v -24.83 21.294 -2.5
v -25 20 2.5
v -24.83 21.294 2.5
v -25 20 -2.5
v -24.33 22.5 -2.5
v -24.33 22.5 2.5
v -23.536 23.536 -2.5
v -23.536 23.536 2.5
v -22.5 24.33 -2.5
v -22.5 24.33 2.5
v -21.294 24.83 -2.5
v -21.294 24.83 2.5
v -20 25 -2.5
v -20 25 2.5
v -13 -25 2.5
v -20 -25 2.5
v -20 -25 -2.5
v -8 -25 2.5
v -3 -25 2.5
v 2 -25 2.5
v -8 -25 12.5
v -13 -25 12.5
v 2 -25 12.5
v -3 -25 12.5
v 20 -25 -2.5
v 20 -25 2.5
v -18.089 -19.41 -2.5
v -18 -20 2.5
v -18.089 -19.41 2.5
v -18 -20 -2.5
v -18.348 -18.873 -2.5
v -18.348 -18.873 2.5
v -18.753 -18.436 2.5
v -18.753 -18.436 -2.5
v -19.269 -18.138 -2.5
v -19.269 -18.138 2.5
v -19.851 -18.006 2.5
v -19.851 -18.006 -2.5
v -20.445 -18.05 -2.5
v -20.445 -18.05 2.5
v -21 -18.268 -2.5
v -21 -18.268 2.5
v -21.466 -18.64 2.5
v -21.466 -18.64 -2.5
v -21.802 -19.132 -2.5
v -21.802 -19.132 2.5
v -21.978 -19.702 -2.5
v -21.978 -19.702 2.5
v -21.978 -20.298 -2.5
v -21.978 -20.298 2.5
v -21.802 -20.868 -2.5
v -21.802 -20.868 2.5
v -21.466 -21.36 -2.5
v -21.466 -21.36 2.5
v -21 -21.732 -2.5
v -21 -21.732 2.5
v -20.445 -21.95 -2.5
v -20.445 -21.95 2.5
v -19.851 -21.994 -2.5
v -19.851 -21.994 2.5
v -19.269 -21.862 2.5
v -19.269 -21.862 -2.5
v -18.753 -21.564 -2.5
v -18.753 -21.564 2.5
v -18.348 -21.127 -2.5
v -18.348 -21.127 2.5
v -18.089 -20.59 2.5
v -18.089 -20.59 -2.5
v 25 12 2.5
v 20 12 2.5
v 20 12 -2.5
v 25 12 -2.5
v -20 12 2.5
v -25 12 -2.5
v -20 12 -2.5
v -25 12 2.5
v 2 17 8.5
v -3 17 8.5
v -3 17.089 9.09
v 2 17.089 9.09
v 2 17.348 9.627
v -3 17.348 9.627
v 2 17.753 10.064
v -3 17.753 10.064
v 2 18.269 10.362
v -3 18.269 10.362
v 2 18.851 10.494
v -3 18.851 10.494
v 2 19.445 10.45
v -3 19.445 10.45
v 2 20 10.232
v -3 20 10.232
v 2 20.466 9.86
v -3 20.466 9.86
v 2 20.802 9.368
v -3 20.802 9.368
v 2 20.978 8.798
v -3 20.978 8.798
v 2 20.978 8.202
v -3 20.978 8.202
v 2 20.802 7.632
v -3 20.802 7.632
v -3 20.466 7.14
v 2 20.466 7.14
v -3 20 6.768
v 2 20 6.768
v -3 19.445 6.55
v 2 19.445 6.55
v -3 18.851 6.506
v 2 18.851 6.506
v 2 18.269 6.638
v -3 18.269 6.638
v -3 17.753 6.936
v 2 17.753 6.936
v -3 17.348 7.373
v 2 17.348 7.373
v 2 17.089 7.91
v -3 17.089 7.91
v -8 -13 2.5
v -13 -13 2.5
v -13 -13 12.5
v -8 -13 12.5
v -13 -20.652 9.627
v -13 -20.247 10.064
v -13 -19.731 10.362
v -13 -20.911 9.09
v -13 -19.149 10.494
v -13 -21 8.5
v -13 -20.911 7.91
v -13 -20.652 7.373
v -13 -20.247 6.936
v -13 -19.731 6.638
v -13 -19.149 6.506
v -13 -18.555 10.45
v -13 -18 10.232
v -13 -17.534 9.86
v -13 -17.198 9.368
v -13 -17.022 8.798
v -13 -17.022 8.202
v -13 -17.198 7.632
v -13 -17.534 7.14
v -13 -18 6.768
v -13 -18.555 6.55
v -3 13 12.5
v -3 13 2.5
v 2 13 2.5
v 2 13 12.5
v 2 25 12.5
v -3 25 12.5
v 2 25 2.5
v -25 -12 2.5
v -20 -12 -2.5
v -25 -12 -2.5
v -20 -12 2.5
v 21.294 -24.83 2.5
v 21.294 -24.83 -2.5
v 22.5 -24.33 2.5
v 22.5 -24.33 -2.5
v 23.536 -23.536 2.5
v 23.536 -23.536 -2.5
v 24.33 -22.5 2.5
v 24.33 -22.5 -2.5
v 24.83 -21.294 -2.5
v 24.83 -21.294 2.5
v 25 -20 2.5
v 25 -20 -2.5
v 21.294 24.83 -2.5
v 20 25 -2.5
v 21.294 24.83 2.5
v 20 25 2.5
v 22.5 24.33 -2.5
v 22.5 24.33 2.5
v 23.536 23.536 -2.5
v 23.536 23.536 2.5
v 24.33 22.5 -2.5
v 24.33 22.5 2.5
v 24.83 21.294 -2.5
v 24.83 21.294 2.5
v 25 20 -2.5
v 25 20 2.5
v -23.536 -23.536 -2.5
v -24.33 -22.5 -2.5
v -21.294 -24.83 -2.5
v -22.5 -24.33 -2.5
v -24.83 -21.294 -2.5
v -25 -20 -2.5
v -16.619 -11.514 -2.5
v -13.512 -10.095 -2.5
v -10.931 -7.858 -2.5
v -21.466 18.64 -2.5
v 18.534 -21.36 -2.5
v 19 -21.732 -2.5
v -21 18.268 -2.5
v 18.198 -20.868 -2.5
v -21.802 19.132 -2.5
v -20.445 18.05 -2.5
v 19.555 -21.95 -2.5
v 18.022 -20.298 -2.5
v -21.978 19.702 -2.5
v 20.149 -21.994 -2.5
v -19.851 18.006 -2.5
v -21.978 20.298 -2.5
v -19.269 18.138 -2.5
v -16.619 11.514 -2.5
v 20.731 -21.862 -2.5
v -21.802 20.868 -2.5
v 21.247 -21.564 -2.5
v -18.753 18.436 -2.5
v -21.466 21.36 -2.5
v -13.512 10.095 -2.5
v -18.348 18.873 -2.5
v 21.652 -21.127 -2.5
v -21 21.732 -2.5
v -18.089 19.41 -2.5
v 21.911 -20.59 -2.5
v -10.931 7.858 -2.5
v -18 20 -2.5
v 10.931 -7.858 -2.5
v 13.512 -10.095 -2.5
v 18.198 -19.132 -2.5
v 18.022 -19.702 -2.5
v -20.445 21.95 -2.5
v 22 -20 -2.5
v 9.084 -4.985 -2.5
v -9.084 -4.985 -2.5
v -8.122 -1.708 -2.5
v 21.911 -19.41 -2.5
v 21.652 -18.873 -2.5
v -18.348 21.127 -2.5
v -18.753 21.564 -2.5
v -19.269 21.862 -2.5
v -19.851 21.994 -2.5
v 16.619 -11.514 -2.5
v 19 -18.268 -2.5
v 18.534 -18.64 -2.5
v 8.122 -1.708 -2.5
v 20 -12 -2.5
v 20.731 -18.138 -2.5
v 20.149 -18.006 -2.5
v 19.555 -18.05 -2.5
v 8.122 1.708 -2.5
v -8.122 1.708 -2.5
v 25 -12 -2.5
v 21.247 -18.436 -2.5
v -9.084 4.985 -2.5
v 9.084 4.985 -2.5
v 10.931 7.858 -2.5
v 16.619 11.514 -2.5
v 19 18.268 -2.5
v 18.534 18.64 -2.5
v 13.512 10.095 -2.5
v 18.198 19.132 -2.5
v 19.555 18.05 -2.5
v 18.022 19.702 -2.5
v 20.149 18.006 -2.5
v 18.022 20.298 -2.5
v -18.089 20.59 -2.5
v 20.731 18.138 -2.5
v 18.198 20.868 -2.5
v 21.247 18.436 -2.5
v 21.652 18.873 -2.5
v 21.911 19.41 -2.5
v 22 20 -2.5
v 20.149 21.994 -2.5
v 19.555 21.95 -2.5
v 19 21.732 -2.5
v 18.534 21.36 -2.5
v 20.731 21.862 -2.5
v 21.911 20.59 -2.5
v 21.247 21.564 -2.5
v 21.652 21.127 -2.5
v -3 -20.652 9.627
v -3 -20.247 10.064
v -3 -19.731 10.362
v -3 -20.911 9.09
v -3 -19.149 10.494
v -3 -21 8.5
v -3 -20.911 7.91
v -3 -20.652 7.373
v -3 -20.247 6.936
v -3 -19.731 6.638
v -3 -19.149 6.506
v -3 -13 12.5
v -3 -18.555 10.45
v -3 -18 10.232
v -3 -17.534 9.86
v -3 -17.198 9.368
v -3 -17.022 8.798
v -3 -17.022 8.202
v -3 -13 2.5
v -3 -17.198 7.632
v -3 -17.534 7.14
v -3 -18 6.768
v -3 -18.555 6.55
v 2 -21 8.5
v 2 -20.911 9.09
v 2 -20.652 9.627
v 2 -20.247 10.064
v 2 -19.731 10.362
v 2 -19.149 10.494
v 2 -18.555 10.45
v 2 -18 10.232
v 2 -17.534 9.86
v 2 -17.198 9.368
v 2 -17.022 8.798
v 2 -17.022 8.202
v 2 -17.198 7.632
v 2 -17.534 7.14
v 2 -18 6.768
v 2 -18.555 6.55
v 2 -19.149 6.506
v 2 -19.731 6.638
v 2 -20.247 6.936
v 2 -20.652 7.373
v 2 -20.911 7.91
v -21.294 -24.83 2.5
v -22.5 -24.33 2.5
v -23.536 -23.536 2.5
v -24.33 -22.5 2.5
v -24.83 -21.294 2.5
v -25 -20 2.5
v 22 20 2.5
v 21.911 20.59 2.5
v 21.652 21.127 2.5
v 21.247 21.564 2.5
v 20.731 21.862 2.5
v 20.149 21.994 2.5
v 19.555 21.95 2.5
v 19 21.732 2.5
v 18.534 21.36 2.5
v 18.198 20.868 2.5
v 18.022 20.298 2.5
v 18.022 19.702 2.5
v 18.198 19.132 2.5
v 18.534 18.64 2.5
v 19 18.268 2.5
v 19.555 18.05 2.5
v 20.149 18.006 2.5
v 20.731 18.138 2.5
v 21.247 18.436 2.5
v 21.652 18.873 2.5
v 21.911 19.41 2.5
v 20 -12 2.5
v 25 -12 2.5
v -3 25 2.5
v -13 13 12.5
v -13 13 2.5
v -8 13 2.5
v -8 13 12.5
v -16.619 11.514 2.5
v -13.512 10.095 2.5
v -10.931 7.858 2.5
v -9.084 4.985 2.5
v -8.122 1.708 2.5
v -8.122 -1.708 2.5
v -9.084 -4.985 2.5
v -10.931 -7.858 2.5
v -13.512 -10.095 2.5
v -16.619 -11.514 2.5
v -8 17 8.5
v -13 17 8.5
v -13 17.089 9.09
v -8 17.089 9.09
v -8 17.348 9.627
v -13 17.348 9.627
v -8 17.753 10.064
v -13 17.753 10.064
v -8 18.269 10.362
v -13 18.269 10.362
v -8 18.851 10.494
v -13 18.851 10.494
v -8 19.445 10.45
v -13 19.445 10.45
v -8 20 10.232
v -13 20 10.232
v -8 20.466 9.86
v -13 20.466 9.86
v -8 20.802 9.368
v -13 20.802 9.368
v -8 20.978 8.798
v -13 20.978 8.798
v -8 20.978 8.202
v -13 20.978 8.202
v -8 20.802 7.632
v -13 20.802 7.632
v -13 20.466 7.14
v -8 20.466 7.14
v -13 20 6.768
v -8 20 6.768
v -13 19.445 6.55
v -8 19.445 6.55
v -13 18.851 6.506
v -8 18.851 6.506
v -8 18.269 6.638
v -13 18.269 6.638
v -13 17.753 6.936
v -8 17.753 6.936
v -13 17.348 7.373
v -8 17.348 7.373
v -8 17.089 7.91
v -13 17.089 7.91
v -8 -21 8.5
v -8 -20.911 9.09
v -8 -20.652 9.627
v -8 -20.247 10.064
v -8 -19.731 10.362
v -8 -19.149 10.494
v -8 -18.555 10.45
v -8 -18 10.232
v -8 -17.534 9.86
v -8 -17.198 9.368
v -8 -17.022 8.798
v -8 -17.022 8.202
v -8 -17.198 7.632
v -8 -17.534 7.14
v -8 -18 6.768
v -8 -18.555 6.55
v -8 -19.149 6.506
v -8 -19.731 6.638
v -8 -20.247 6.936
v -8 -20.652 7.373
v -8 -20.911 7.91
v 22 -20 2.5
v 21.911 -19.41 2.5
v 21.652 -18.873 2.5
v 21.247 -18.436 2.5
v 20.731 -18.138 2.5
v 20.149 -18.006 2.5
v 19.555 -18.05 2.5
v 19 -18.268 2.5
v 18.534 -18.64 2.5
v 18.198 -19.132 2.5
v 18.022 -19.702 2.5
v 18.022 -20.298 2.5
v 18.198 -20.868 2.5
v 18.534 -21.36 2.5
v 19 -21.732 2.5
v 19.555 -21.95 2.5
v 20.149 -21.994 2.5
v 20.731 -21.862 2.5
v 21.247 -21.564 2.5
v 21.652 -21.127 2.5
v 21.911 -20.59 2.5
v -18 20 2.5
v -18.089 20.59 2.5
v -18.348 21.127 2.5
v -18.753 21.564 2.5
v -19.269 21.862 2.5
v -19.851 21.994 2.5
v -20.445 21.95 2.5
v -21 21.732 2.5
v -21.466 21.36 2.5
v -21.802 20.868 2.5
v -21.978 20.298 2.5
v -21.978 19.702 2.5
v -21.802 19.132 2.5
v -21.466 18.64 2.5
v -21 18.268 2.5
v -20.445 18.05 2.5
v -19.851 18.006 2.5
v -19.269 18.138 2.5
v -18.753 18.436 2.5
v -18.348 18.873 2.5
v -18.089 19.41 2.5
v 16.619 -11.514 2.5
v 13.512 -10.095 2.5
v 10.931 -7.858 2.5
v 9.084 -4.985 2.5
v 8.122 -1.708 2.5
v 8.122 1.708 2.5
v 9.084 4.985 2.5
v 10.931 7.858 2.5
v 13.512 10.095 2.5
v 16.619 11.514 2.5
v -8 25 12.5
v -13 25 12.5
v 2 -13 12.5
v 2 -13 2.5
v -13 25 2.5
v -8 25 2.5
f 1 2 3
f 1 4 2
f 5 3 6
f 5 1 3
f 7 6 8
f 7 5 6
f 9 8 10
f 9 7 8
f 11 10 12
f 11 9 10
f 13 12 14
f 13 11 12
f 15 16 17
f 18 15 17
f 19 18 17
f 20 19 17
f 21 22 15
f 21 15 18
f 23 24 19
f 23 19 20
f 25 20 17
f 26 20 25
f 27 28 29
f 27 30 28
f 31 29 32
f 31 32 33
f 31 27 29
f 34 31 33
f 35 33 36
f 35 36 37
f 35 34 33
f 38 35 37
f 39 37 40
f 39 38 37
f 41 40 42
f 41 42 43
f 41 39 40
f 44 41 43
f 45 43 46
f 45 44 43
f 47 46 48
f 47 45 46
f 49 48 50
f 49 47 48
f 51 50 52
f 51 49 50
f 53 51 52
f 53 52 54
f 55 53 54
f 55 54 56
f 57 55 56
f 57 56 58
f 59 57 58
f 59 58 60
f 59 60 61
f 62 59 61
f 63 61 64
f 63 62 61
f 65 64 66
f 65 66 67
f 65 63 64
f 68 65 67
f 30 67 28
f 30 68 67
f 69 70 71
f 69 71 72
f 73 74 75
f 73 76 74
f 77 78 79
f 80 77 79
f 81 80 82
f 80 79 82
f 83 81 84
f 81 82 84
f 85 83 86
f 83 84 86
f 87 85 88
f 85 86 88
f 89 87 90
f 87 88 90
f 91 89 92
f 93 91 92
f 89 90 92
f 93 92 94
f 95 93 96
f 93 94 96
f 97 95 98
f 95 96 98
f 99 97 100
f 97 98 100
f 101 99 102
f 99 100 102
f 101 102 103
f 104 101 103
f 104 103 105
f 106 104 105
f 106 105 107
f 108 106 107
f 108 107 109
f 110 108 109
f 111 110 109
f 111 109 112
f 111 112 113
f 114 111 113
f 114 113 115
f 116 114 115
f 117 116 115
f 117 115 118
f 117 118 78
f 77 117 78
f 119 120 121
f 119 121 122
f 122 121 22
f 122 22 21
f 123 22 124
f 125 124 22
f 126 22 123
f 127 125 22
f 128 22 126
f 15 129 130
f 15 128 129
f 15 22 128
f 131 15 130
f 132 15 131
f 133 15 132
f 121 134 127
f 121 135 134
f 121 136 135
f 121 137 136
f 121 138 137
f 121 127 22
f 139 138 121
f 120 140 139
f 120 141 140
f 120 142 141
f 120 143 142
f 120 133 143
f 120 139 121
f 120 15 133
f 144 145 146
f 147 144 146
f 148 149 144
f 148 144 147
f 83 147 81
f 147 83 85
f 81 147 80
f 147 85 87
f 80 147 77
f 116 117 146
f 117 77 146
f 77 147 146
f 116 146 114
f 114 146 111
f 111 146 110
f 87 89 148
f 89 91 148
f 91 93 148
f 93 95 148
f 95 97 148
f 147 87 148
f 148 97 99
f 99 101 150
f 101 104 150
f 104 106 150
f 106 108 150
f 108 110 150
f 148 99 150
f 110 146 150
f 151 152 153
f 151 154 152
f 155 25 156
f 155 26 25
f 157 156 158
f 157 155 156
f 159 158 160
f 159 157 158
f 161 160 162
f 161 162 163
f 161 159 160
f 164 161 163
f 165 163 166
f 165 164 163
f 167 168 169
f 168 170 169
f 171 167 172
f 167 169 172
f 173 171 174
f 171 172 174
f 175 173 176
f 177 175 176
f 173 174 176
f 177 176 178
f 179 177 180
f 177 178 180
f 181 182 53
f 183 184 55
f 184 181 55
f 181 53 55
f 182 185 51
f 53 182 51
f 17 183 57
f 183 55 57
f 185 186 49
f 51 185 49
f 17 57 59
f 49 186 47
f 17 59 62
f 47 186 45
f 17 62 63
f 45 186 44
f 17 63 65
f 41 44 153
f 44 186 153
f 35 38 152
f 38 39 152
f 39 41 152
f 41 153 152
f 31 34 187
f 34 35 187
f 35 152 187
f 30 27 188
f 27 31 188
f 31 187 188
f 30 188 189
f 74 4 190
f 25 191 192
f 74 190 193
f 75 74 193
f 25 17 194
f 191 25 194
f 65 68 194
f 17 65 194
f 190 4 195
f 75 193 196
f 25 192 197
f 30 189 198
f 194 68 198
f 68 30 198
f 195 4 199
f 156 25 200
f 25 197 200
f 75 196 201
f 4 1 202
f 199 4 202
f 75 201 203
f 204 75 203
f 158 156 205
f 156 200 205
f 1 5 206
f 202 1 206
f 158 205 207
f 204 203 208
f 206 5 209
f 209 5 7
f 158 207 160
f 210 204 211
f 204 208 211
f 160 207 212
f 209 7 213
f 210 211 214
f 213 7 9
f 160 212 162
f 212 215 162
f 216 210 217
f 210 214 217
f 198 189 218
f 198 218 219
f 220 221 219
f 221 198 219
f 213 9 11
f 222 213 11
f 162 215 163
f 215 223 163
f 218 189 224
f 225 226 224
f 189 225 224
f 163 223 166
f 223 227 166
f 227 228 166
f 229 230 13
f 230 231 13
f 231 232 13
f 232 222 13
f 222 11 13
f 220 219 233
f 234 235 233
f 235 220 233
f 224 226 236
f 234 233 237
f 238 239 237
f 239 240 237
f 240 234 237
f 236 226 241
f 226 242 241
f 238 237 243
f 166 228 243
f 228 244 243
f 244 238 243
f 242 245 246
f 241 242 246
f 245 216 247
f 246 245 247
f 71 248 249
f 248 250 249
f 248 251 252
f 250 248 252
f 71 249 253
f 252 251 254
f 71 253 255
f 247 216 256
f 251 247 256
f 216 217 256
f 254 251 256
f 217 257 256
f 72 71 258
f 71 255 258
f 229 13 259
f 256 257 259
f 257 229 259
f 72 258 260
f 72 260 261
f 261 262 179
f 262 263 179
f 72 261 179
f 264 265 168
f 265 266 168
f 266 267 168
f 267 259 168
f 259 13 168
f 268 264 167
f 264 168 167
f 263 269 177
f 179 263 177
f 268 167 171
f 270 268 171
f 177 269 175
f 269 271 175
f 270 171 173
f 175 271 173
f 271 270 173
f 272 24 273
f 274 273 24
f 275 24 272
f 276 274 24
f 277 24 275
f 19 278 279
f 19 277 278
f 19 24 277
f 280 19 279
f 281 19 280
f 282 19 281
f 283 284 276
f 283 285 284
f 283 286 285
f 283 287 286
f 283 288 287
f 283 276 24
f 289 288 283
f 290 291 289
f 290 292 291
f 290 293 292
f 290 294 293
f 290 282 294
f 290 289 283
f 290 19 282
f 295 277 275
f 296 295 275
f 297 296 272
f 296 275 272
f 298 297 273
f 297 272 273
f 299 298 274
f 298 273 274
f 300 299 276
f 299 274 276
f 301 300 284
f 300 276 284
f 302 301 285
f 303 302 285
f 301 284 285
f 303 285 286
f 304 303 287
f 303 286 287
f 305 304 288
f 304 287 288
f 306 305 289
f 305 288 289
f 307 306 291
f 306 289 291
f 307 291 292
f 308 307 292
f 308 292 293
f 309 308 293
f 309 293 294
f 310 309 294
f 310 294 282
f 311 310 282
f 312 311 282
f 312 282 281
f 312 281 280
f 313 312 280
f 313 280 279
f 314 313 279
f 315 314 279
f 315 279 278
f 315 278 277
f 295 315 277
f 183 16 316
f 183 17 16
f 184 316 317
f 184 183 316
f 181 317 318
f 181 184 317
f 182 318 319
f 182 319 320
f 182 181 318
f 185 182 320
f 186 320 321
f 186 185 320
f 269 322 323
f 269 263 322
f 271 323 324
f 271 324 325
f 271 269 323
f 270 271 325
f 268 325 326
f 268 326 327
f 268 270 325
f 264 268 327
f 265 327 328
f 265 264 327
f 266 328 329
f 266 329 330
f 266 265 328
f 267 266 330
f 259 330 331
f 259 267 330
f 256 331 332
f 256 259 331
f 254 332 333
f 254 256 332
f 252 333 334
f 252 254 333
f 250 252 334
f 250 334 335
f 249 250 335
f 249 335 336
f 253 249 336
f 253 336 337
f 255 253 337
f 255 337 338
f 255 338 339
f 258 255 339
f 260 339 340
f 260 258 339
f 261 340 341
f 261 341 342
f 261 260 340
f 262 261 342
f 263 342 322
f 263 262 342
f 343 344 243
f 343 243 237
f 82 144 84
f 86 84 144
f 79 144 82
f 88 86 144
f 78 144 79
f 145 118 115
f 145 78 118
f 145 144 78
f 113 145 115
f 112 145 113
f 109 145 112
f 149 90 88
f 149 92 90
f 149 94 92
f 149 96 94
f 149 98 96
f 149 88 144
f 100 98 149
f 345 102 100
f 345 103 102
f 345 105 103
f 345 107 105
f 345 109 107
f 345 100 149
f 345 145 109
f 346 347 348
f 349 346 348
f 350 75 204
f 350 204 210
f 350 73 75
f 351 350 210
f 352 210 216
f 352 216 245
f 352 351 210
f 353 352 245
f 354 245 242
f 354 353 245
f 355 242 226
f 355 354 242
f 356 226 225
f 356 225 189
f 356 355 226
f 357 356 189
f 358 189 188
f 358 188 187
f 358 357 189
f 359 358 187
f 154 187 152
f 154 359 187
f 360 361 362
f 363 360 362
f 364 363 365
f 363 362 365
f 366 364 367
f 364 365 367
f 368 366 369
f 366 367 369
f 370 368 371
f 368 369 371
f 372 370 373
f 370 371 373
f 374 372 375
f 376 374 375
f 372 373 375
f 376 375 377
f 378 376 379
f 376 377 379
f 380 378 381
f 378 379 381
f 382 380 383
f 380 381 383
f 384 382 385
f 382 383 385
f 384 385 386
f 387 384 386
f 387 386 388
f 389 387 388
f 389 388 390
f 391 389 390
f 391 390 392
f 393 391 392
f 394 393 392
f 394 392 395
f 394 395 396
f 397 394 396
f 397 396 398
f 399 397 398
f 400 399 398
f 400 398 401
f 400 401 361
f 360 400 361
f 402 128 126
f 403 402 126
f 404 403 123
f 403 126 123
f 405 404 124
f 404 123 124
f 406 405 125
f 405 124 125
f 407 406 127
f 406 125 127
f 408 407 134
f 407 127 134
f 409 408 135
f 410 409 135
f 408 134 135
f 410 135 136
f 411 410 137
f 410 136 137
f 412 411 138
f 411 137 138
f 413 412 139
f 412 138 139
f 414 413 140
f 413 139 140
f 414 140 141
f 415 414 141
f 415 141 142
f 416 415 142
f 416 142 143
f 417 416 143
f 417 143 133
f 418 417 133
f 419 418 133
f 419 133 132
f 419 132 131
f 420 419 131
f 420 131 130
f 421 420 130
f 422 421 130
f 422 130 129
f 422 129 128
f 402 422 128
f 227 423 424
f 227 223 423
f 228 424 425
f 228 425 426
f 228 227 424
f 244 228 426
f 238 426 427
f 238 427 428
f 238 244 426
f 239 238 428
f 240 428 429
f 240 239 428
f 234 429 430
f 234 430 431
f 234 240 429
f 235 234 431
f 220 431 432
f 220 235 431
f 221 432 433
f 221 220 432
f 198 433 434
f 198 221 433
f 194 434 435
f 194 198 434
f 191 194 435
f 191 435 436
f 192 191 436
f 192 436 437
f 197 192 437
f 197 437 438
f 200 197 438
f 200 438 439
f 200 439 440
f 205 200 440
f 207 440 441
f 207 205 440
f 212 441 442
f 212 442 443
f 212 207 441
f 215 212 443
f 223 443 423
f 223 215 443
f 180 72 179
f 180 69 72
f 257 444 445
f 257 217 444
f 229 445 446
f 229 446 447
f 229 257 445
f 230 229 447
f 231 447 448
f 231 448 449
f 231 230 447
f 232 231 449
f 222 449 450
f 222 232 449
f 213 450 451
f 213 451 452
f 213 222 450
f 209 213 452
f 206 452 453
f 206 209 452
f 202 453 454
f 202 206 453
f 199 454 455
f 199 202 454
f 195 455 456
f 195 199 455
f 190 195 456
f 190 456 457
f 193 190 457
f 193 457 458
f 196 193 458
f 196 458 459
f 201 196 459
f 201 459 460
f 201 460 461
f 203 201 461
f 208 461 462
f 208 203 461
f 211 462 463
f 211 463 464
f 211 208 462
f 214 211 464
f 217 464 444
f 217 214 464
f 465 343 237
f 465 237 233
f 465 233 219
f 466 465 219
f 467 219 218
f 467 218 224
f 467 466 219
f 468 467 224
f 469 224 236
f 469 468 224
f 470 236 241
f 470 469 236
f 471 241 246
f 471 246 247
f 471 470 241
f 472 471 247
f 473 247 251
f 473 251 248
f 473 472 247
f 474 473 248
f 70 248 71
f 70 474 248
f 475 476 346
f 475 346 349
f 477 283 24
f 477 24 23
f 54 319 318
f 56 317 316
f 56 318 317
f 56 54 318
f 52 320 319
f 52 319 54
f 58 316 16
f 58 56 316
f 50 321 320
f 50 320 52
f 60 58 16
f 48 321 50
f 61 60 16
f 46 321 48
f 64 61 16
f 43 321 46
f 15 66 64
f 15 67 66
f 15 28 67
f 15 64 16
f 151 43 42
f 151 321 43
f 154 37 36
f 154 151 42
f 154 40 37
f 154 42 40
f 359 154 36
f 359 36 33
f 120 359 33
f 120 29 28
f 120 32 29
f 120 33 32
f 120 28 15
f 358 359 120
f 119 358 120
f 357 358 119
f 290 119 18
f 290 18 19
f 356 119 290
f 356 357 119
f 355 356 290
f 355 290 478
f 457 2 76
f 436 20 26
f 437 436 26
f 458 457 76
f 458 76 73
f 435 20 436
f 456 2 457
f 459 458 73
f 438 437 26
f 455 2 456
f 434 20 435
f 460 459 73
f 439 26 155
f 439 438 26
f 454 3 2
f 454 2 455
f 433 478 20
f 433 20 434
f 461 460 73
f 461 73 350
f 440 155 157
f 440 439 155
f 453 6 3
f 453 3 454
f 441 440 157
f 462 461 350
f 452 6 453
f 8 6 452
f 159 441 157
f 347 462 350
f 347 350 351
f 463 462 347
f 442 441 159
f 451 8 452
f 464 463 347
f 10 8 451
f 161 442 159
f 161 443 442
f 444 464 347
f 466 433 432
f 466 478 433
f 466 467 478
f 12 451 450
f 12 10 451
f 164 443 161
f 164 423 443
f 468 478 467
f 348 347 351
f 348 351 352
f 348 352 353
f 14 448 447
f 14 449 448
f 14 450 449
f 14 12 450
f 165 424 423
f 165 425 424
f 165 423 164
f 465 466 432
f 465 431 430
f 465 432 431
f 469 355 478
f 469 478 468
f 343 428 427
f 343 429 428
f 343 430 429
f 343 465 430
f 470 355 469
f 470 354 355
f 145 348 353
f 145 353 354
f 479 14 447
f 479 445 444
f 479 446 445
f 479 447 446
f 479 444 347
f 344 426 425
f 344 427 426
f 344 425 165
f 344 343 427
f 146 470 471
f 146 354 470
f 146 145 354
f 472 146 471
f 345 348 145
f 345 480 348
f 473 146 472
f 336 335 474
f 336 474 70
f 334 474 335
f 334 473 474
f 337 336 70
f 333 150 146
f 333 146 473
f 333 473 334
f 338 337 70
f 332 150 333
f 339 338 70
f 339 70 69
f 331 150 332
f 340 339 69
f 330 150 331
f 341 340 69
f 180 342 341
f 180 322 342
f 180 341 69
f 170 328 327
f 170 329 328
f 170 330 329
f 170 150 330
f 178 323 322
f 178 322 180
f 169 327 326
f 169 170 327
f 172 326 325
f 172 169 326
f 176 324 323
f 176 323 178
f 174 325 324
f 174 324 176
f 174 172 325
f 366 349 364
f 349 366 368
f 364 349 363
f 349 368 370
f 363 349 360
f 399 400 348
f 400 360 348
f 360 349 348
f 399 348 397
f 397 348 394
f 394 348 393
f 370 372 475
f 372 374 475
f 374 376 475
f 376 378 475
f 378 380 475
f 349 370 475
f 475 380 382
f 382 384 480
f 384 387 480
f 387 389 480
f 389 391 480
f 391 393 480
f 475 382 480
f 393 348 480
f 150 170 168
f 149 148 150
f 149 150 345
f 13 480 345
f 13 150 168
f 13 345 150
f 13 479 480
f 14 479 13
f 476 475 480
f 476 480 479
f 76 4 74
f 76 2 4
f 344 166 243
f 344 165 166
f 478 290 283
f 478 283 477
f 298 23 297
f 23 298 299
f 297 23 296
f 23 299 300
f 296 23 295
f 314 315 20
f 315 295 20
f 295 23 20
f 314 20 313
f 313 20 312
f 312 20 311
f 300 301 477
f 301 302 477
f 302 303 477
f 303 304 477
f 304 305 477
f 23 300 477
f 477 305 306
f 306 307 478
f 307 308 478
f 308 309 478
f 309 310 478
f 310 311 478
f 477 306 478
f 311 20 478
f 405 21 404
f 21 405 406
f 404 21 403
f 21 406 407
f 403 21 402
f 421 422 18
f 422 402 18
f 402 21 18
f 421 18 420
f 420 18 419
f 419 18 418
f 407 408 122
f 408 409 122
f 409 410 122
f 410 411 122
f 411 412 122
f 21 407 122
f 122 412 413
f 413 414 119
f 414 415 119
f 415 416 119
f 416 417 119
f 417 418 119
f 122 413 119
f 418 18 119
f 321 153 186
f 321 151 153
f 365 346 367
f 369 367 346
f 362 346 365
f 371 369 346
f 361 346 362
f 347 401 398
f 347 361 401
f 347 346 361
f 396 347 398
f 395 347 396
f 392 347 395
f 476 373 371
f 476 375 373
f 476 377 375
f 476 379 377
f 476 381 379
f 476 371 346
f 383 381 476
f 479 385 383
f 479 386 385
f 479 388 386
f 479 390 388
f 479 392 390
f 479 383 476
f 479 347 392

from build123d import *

# Parameters (mm, degrees)
SKETCH_1_R          = 2
EXTRUDE_1_DEPTH     = 2.5
FILLET_1_R          = 5
SKETCH_2_W          = 5
SKETCH_2_H          = 12
EXTRUDE_2_DEPTH     = 10
SKETCH_3_R          = 2
CUT_EXTRUDE_1_DEPTH = 48.172555581


with BuildPart() as part:
    # 草图1 → 凸台-拉伸1 (new, symmetric)
    with BuildSketch(Plane.XY):
        with BuildLine():
            Line((-25, -25), (25, -25))
            Line((25, -25), (25, -12))
            Line((25, -12), (20, -12))
            ThreePointArc((20, -12), (8, 0), (20, 12))
            Line((20, 12), (25, 12))
            Line((25, 12), (25, 25))
            Line((25, 25), (-25, 25))
            Line((-25, 25), (-25, 12))
            Line((-25, 12), (-20, 12))
            ThreePointArc((-20, 12), (-8, 0), (-20, -12))
            Line((-20, -12), (-25, -12))
            Line((-25, -12), (-25, -25))
        make_face()
        with Locations((-20, 20)):
            Circle(SKETCH_1_R, mode=Mode.SUBTRACT)
        with Locations((-20, -20)):
            Circle(SKETCH_1_R, mode=Mode.SUBTRACT)
        with Locations((20, 20)):
            Circle(SKETCH_1_R, mode=Mode.SUBTRACT)
        with Locations((20, -20)):
            Circle(SKETCH_1_R, mode=Mode.SUBTRACT)
    extrude(amount=EXTRUDE_1_DEPTH, both=True)

    # 圆角1
    fillet_1_edges = [part.edges().sort_by_distance(p)[0] for p in [
        (-25, 25, 0),
        (25, 25, 0),
        (25, -25, 0),
        (-25, -25, 0),
    ]]
    fillet(fillet_1_edges, radius=FILLET_1_R)

    # 草图2 → 凸台-拉伸2 (add)
    with BuildSketch(Plane.XY.offset(2.5)):
        with Locations((-10.5, 19)):
            Rectangle(SKETCH_2_W, SKETCH_2_H)
        with Locations((-0.5, -19)):
            Rectangle(SKETCH_2_W, SKETCH_2_H)
        with Locations((-0.5, 19)):
            Rectangle(SKETCH_2_W, SKETCH_2_H)
        with Locations((-10.5, -19)):
            Rectangle(SKETCH_2_W, SKETCH_2_H)
    extrude(amount=EXTRUDE_2_DEPTH)

    # 草图3 → 切除-拉伸1 (cut, through all)
    with BuildSketch(Plane.ZY.offset(13)):
        with Locations(Location((8.5, 19, 0), (0, 0, 270))):
            Circle(SKETCH_3_R)
        with Locations(Location((8.5, -19, 0), (0, 0, 270))):
            Circle(SKETCH_3_R)
    extrude(amount=-CUT_EXTRUDE_1_DEPTH, mode=Mode.SUBTRACT)


solid = part.part
